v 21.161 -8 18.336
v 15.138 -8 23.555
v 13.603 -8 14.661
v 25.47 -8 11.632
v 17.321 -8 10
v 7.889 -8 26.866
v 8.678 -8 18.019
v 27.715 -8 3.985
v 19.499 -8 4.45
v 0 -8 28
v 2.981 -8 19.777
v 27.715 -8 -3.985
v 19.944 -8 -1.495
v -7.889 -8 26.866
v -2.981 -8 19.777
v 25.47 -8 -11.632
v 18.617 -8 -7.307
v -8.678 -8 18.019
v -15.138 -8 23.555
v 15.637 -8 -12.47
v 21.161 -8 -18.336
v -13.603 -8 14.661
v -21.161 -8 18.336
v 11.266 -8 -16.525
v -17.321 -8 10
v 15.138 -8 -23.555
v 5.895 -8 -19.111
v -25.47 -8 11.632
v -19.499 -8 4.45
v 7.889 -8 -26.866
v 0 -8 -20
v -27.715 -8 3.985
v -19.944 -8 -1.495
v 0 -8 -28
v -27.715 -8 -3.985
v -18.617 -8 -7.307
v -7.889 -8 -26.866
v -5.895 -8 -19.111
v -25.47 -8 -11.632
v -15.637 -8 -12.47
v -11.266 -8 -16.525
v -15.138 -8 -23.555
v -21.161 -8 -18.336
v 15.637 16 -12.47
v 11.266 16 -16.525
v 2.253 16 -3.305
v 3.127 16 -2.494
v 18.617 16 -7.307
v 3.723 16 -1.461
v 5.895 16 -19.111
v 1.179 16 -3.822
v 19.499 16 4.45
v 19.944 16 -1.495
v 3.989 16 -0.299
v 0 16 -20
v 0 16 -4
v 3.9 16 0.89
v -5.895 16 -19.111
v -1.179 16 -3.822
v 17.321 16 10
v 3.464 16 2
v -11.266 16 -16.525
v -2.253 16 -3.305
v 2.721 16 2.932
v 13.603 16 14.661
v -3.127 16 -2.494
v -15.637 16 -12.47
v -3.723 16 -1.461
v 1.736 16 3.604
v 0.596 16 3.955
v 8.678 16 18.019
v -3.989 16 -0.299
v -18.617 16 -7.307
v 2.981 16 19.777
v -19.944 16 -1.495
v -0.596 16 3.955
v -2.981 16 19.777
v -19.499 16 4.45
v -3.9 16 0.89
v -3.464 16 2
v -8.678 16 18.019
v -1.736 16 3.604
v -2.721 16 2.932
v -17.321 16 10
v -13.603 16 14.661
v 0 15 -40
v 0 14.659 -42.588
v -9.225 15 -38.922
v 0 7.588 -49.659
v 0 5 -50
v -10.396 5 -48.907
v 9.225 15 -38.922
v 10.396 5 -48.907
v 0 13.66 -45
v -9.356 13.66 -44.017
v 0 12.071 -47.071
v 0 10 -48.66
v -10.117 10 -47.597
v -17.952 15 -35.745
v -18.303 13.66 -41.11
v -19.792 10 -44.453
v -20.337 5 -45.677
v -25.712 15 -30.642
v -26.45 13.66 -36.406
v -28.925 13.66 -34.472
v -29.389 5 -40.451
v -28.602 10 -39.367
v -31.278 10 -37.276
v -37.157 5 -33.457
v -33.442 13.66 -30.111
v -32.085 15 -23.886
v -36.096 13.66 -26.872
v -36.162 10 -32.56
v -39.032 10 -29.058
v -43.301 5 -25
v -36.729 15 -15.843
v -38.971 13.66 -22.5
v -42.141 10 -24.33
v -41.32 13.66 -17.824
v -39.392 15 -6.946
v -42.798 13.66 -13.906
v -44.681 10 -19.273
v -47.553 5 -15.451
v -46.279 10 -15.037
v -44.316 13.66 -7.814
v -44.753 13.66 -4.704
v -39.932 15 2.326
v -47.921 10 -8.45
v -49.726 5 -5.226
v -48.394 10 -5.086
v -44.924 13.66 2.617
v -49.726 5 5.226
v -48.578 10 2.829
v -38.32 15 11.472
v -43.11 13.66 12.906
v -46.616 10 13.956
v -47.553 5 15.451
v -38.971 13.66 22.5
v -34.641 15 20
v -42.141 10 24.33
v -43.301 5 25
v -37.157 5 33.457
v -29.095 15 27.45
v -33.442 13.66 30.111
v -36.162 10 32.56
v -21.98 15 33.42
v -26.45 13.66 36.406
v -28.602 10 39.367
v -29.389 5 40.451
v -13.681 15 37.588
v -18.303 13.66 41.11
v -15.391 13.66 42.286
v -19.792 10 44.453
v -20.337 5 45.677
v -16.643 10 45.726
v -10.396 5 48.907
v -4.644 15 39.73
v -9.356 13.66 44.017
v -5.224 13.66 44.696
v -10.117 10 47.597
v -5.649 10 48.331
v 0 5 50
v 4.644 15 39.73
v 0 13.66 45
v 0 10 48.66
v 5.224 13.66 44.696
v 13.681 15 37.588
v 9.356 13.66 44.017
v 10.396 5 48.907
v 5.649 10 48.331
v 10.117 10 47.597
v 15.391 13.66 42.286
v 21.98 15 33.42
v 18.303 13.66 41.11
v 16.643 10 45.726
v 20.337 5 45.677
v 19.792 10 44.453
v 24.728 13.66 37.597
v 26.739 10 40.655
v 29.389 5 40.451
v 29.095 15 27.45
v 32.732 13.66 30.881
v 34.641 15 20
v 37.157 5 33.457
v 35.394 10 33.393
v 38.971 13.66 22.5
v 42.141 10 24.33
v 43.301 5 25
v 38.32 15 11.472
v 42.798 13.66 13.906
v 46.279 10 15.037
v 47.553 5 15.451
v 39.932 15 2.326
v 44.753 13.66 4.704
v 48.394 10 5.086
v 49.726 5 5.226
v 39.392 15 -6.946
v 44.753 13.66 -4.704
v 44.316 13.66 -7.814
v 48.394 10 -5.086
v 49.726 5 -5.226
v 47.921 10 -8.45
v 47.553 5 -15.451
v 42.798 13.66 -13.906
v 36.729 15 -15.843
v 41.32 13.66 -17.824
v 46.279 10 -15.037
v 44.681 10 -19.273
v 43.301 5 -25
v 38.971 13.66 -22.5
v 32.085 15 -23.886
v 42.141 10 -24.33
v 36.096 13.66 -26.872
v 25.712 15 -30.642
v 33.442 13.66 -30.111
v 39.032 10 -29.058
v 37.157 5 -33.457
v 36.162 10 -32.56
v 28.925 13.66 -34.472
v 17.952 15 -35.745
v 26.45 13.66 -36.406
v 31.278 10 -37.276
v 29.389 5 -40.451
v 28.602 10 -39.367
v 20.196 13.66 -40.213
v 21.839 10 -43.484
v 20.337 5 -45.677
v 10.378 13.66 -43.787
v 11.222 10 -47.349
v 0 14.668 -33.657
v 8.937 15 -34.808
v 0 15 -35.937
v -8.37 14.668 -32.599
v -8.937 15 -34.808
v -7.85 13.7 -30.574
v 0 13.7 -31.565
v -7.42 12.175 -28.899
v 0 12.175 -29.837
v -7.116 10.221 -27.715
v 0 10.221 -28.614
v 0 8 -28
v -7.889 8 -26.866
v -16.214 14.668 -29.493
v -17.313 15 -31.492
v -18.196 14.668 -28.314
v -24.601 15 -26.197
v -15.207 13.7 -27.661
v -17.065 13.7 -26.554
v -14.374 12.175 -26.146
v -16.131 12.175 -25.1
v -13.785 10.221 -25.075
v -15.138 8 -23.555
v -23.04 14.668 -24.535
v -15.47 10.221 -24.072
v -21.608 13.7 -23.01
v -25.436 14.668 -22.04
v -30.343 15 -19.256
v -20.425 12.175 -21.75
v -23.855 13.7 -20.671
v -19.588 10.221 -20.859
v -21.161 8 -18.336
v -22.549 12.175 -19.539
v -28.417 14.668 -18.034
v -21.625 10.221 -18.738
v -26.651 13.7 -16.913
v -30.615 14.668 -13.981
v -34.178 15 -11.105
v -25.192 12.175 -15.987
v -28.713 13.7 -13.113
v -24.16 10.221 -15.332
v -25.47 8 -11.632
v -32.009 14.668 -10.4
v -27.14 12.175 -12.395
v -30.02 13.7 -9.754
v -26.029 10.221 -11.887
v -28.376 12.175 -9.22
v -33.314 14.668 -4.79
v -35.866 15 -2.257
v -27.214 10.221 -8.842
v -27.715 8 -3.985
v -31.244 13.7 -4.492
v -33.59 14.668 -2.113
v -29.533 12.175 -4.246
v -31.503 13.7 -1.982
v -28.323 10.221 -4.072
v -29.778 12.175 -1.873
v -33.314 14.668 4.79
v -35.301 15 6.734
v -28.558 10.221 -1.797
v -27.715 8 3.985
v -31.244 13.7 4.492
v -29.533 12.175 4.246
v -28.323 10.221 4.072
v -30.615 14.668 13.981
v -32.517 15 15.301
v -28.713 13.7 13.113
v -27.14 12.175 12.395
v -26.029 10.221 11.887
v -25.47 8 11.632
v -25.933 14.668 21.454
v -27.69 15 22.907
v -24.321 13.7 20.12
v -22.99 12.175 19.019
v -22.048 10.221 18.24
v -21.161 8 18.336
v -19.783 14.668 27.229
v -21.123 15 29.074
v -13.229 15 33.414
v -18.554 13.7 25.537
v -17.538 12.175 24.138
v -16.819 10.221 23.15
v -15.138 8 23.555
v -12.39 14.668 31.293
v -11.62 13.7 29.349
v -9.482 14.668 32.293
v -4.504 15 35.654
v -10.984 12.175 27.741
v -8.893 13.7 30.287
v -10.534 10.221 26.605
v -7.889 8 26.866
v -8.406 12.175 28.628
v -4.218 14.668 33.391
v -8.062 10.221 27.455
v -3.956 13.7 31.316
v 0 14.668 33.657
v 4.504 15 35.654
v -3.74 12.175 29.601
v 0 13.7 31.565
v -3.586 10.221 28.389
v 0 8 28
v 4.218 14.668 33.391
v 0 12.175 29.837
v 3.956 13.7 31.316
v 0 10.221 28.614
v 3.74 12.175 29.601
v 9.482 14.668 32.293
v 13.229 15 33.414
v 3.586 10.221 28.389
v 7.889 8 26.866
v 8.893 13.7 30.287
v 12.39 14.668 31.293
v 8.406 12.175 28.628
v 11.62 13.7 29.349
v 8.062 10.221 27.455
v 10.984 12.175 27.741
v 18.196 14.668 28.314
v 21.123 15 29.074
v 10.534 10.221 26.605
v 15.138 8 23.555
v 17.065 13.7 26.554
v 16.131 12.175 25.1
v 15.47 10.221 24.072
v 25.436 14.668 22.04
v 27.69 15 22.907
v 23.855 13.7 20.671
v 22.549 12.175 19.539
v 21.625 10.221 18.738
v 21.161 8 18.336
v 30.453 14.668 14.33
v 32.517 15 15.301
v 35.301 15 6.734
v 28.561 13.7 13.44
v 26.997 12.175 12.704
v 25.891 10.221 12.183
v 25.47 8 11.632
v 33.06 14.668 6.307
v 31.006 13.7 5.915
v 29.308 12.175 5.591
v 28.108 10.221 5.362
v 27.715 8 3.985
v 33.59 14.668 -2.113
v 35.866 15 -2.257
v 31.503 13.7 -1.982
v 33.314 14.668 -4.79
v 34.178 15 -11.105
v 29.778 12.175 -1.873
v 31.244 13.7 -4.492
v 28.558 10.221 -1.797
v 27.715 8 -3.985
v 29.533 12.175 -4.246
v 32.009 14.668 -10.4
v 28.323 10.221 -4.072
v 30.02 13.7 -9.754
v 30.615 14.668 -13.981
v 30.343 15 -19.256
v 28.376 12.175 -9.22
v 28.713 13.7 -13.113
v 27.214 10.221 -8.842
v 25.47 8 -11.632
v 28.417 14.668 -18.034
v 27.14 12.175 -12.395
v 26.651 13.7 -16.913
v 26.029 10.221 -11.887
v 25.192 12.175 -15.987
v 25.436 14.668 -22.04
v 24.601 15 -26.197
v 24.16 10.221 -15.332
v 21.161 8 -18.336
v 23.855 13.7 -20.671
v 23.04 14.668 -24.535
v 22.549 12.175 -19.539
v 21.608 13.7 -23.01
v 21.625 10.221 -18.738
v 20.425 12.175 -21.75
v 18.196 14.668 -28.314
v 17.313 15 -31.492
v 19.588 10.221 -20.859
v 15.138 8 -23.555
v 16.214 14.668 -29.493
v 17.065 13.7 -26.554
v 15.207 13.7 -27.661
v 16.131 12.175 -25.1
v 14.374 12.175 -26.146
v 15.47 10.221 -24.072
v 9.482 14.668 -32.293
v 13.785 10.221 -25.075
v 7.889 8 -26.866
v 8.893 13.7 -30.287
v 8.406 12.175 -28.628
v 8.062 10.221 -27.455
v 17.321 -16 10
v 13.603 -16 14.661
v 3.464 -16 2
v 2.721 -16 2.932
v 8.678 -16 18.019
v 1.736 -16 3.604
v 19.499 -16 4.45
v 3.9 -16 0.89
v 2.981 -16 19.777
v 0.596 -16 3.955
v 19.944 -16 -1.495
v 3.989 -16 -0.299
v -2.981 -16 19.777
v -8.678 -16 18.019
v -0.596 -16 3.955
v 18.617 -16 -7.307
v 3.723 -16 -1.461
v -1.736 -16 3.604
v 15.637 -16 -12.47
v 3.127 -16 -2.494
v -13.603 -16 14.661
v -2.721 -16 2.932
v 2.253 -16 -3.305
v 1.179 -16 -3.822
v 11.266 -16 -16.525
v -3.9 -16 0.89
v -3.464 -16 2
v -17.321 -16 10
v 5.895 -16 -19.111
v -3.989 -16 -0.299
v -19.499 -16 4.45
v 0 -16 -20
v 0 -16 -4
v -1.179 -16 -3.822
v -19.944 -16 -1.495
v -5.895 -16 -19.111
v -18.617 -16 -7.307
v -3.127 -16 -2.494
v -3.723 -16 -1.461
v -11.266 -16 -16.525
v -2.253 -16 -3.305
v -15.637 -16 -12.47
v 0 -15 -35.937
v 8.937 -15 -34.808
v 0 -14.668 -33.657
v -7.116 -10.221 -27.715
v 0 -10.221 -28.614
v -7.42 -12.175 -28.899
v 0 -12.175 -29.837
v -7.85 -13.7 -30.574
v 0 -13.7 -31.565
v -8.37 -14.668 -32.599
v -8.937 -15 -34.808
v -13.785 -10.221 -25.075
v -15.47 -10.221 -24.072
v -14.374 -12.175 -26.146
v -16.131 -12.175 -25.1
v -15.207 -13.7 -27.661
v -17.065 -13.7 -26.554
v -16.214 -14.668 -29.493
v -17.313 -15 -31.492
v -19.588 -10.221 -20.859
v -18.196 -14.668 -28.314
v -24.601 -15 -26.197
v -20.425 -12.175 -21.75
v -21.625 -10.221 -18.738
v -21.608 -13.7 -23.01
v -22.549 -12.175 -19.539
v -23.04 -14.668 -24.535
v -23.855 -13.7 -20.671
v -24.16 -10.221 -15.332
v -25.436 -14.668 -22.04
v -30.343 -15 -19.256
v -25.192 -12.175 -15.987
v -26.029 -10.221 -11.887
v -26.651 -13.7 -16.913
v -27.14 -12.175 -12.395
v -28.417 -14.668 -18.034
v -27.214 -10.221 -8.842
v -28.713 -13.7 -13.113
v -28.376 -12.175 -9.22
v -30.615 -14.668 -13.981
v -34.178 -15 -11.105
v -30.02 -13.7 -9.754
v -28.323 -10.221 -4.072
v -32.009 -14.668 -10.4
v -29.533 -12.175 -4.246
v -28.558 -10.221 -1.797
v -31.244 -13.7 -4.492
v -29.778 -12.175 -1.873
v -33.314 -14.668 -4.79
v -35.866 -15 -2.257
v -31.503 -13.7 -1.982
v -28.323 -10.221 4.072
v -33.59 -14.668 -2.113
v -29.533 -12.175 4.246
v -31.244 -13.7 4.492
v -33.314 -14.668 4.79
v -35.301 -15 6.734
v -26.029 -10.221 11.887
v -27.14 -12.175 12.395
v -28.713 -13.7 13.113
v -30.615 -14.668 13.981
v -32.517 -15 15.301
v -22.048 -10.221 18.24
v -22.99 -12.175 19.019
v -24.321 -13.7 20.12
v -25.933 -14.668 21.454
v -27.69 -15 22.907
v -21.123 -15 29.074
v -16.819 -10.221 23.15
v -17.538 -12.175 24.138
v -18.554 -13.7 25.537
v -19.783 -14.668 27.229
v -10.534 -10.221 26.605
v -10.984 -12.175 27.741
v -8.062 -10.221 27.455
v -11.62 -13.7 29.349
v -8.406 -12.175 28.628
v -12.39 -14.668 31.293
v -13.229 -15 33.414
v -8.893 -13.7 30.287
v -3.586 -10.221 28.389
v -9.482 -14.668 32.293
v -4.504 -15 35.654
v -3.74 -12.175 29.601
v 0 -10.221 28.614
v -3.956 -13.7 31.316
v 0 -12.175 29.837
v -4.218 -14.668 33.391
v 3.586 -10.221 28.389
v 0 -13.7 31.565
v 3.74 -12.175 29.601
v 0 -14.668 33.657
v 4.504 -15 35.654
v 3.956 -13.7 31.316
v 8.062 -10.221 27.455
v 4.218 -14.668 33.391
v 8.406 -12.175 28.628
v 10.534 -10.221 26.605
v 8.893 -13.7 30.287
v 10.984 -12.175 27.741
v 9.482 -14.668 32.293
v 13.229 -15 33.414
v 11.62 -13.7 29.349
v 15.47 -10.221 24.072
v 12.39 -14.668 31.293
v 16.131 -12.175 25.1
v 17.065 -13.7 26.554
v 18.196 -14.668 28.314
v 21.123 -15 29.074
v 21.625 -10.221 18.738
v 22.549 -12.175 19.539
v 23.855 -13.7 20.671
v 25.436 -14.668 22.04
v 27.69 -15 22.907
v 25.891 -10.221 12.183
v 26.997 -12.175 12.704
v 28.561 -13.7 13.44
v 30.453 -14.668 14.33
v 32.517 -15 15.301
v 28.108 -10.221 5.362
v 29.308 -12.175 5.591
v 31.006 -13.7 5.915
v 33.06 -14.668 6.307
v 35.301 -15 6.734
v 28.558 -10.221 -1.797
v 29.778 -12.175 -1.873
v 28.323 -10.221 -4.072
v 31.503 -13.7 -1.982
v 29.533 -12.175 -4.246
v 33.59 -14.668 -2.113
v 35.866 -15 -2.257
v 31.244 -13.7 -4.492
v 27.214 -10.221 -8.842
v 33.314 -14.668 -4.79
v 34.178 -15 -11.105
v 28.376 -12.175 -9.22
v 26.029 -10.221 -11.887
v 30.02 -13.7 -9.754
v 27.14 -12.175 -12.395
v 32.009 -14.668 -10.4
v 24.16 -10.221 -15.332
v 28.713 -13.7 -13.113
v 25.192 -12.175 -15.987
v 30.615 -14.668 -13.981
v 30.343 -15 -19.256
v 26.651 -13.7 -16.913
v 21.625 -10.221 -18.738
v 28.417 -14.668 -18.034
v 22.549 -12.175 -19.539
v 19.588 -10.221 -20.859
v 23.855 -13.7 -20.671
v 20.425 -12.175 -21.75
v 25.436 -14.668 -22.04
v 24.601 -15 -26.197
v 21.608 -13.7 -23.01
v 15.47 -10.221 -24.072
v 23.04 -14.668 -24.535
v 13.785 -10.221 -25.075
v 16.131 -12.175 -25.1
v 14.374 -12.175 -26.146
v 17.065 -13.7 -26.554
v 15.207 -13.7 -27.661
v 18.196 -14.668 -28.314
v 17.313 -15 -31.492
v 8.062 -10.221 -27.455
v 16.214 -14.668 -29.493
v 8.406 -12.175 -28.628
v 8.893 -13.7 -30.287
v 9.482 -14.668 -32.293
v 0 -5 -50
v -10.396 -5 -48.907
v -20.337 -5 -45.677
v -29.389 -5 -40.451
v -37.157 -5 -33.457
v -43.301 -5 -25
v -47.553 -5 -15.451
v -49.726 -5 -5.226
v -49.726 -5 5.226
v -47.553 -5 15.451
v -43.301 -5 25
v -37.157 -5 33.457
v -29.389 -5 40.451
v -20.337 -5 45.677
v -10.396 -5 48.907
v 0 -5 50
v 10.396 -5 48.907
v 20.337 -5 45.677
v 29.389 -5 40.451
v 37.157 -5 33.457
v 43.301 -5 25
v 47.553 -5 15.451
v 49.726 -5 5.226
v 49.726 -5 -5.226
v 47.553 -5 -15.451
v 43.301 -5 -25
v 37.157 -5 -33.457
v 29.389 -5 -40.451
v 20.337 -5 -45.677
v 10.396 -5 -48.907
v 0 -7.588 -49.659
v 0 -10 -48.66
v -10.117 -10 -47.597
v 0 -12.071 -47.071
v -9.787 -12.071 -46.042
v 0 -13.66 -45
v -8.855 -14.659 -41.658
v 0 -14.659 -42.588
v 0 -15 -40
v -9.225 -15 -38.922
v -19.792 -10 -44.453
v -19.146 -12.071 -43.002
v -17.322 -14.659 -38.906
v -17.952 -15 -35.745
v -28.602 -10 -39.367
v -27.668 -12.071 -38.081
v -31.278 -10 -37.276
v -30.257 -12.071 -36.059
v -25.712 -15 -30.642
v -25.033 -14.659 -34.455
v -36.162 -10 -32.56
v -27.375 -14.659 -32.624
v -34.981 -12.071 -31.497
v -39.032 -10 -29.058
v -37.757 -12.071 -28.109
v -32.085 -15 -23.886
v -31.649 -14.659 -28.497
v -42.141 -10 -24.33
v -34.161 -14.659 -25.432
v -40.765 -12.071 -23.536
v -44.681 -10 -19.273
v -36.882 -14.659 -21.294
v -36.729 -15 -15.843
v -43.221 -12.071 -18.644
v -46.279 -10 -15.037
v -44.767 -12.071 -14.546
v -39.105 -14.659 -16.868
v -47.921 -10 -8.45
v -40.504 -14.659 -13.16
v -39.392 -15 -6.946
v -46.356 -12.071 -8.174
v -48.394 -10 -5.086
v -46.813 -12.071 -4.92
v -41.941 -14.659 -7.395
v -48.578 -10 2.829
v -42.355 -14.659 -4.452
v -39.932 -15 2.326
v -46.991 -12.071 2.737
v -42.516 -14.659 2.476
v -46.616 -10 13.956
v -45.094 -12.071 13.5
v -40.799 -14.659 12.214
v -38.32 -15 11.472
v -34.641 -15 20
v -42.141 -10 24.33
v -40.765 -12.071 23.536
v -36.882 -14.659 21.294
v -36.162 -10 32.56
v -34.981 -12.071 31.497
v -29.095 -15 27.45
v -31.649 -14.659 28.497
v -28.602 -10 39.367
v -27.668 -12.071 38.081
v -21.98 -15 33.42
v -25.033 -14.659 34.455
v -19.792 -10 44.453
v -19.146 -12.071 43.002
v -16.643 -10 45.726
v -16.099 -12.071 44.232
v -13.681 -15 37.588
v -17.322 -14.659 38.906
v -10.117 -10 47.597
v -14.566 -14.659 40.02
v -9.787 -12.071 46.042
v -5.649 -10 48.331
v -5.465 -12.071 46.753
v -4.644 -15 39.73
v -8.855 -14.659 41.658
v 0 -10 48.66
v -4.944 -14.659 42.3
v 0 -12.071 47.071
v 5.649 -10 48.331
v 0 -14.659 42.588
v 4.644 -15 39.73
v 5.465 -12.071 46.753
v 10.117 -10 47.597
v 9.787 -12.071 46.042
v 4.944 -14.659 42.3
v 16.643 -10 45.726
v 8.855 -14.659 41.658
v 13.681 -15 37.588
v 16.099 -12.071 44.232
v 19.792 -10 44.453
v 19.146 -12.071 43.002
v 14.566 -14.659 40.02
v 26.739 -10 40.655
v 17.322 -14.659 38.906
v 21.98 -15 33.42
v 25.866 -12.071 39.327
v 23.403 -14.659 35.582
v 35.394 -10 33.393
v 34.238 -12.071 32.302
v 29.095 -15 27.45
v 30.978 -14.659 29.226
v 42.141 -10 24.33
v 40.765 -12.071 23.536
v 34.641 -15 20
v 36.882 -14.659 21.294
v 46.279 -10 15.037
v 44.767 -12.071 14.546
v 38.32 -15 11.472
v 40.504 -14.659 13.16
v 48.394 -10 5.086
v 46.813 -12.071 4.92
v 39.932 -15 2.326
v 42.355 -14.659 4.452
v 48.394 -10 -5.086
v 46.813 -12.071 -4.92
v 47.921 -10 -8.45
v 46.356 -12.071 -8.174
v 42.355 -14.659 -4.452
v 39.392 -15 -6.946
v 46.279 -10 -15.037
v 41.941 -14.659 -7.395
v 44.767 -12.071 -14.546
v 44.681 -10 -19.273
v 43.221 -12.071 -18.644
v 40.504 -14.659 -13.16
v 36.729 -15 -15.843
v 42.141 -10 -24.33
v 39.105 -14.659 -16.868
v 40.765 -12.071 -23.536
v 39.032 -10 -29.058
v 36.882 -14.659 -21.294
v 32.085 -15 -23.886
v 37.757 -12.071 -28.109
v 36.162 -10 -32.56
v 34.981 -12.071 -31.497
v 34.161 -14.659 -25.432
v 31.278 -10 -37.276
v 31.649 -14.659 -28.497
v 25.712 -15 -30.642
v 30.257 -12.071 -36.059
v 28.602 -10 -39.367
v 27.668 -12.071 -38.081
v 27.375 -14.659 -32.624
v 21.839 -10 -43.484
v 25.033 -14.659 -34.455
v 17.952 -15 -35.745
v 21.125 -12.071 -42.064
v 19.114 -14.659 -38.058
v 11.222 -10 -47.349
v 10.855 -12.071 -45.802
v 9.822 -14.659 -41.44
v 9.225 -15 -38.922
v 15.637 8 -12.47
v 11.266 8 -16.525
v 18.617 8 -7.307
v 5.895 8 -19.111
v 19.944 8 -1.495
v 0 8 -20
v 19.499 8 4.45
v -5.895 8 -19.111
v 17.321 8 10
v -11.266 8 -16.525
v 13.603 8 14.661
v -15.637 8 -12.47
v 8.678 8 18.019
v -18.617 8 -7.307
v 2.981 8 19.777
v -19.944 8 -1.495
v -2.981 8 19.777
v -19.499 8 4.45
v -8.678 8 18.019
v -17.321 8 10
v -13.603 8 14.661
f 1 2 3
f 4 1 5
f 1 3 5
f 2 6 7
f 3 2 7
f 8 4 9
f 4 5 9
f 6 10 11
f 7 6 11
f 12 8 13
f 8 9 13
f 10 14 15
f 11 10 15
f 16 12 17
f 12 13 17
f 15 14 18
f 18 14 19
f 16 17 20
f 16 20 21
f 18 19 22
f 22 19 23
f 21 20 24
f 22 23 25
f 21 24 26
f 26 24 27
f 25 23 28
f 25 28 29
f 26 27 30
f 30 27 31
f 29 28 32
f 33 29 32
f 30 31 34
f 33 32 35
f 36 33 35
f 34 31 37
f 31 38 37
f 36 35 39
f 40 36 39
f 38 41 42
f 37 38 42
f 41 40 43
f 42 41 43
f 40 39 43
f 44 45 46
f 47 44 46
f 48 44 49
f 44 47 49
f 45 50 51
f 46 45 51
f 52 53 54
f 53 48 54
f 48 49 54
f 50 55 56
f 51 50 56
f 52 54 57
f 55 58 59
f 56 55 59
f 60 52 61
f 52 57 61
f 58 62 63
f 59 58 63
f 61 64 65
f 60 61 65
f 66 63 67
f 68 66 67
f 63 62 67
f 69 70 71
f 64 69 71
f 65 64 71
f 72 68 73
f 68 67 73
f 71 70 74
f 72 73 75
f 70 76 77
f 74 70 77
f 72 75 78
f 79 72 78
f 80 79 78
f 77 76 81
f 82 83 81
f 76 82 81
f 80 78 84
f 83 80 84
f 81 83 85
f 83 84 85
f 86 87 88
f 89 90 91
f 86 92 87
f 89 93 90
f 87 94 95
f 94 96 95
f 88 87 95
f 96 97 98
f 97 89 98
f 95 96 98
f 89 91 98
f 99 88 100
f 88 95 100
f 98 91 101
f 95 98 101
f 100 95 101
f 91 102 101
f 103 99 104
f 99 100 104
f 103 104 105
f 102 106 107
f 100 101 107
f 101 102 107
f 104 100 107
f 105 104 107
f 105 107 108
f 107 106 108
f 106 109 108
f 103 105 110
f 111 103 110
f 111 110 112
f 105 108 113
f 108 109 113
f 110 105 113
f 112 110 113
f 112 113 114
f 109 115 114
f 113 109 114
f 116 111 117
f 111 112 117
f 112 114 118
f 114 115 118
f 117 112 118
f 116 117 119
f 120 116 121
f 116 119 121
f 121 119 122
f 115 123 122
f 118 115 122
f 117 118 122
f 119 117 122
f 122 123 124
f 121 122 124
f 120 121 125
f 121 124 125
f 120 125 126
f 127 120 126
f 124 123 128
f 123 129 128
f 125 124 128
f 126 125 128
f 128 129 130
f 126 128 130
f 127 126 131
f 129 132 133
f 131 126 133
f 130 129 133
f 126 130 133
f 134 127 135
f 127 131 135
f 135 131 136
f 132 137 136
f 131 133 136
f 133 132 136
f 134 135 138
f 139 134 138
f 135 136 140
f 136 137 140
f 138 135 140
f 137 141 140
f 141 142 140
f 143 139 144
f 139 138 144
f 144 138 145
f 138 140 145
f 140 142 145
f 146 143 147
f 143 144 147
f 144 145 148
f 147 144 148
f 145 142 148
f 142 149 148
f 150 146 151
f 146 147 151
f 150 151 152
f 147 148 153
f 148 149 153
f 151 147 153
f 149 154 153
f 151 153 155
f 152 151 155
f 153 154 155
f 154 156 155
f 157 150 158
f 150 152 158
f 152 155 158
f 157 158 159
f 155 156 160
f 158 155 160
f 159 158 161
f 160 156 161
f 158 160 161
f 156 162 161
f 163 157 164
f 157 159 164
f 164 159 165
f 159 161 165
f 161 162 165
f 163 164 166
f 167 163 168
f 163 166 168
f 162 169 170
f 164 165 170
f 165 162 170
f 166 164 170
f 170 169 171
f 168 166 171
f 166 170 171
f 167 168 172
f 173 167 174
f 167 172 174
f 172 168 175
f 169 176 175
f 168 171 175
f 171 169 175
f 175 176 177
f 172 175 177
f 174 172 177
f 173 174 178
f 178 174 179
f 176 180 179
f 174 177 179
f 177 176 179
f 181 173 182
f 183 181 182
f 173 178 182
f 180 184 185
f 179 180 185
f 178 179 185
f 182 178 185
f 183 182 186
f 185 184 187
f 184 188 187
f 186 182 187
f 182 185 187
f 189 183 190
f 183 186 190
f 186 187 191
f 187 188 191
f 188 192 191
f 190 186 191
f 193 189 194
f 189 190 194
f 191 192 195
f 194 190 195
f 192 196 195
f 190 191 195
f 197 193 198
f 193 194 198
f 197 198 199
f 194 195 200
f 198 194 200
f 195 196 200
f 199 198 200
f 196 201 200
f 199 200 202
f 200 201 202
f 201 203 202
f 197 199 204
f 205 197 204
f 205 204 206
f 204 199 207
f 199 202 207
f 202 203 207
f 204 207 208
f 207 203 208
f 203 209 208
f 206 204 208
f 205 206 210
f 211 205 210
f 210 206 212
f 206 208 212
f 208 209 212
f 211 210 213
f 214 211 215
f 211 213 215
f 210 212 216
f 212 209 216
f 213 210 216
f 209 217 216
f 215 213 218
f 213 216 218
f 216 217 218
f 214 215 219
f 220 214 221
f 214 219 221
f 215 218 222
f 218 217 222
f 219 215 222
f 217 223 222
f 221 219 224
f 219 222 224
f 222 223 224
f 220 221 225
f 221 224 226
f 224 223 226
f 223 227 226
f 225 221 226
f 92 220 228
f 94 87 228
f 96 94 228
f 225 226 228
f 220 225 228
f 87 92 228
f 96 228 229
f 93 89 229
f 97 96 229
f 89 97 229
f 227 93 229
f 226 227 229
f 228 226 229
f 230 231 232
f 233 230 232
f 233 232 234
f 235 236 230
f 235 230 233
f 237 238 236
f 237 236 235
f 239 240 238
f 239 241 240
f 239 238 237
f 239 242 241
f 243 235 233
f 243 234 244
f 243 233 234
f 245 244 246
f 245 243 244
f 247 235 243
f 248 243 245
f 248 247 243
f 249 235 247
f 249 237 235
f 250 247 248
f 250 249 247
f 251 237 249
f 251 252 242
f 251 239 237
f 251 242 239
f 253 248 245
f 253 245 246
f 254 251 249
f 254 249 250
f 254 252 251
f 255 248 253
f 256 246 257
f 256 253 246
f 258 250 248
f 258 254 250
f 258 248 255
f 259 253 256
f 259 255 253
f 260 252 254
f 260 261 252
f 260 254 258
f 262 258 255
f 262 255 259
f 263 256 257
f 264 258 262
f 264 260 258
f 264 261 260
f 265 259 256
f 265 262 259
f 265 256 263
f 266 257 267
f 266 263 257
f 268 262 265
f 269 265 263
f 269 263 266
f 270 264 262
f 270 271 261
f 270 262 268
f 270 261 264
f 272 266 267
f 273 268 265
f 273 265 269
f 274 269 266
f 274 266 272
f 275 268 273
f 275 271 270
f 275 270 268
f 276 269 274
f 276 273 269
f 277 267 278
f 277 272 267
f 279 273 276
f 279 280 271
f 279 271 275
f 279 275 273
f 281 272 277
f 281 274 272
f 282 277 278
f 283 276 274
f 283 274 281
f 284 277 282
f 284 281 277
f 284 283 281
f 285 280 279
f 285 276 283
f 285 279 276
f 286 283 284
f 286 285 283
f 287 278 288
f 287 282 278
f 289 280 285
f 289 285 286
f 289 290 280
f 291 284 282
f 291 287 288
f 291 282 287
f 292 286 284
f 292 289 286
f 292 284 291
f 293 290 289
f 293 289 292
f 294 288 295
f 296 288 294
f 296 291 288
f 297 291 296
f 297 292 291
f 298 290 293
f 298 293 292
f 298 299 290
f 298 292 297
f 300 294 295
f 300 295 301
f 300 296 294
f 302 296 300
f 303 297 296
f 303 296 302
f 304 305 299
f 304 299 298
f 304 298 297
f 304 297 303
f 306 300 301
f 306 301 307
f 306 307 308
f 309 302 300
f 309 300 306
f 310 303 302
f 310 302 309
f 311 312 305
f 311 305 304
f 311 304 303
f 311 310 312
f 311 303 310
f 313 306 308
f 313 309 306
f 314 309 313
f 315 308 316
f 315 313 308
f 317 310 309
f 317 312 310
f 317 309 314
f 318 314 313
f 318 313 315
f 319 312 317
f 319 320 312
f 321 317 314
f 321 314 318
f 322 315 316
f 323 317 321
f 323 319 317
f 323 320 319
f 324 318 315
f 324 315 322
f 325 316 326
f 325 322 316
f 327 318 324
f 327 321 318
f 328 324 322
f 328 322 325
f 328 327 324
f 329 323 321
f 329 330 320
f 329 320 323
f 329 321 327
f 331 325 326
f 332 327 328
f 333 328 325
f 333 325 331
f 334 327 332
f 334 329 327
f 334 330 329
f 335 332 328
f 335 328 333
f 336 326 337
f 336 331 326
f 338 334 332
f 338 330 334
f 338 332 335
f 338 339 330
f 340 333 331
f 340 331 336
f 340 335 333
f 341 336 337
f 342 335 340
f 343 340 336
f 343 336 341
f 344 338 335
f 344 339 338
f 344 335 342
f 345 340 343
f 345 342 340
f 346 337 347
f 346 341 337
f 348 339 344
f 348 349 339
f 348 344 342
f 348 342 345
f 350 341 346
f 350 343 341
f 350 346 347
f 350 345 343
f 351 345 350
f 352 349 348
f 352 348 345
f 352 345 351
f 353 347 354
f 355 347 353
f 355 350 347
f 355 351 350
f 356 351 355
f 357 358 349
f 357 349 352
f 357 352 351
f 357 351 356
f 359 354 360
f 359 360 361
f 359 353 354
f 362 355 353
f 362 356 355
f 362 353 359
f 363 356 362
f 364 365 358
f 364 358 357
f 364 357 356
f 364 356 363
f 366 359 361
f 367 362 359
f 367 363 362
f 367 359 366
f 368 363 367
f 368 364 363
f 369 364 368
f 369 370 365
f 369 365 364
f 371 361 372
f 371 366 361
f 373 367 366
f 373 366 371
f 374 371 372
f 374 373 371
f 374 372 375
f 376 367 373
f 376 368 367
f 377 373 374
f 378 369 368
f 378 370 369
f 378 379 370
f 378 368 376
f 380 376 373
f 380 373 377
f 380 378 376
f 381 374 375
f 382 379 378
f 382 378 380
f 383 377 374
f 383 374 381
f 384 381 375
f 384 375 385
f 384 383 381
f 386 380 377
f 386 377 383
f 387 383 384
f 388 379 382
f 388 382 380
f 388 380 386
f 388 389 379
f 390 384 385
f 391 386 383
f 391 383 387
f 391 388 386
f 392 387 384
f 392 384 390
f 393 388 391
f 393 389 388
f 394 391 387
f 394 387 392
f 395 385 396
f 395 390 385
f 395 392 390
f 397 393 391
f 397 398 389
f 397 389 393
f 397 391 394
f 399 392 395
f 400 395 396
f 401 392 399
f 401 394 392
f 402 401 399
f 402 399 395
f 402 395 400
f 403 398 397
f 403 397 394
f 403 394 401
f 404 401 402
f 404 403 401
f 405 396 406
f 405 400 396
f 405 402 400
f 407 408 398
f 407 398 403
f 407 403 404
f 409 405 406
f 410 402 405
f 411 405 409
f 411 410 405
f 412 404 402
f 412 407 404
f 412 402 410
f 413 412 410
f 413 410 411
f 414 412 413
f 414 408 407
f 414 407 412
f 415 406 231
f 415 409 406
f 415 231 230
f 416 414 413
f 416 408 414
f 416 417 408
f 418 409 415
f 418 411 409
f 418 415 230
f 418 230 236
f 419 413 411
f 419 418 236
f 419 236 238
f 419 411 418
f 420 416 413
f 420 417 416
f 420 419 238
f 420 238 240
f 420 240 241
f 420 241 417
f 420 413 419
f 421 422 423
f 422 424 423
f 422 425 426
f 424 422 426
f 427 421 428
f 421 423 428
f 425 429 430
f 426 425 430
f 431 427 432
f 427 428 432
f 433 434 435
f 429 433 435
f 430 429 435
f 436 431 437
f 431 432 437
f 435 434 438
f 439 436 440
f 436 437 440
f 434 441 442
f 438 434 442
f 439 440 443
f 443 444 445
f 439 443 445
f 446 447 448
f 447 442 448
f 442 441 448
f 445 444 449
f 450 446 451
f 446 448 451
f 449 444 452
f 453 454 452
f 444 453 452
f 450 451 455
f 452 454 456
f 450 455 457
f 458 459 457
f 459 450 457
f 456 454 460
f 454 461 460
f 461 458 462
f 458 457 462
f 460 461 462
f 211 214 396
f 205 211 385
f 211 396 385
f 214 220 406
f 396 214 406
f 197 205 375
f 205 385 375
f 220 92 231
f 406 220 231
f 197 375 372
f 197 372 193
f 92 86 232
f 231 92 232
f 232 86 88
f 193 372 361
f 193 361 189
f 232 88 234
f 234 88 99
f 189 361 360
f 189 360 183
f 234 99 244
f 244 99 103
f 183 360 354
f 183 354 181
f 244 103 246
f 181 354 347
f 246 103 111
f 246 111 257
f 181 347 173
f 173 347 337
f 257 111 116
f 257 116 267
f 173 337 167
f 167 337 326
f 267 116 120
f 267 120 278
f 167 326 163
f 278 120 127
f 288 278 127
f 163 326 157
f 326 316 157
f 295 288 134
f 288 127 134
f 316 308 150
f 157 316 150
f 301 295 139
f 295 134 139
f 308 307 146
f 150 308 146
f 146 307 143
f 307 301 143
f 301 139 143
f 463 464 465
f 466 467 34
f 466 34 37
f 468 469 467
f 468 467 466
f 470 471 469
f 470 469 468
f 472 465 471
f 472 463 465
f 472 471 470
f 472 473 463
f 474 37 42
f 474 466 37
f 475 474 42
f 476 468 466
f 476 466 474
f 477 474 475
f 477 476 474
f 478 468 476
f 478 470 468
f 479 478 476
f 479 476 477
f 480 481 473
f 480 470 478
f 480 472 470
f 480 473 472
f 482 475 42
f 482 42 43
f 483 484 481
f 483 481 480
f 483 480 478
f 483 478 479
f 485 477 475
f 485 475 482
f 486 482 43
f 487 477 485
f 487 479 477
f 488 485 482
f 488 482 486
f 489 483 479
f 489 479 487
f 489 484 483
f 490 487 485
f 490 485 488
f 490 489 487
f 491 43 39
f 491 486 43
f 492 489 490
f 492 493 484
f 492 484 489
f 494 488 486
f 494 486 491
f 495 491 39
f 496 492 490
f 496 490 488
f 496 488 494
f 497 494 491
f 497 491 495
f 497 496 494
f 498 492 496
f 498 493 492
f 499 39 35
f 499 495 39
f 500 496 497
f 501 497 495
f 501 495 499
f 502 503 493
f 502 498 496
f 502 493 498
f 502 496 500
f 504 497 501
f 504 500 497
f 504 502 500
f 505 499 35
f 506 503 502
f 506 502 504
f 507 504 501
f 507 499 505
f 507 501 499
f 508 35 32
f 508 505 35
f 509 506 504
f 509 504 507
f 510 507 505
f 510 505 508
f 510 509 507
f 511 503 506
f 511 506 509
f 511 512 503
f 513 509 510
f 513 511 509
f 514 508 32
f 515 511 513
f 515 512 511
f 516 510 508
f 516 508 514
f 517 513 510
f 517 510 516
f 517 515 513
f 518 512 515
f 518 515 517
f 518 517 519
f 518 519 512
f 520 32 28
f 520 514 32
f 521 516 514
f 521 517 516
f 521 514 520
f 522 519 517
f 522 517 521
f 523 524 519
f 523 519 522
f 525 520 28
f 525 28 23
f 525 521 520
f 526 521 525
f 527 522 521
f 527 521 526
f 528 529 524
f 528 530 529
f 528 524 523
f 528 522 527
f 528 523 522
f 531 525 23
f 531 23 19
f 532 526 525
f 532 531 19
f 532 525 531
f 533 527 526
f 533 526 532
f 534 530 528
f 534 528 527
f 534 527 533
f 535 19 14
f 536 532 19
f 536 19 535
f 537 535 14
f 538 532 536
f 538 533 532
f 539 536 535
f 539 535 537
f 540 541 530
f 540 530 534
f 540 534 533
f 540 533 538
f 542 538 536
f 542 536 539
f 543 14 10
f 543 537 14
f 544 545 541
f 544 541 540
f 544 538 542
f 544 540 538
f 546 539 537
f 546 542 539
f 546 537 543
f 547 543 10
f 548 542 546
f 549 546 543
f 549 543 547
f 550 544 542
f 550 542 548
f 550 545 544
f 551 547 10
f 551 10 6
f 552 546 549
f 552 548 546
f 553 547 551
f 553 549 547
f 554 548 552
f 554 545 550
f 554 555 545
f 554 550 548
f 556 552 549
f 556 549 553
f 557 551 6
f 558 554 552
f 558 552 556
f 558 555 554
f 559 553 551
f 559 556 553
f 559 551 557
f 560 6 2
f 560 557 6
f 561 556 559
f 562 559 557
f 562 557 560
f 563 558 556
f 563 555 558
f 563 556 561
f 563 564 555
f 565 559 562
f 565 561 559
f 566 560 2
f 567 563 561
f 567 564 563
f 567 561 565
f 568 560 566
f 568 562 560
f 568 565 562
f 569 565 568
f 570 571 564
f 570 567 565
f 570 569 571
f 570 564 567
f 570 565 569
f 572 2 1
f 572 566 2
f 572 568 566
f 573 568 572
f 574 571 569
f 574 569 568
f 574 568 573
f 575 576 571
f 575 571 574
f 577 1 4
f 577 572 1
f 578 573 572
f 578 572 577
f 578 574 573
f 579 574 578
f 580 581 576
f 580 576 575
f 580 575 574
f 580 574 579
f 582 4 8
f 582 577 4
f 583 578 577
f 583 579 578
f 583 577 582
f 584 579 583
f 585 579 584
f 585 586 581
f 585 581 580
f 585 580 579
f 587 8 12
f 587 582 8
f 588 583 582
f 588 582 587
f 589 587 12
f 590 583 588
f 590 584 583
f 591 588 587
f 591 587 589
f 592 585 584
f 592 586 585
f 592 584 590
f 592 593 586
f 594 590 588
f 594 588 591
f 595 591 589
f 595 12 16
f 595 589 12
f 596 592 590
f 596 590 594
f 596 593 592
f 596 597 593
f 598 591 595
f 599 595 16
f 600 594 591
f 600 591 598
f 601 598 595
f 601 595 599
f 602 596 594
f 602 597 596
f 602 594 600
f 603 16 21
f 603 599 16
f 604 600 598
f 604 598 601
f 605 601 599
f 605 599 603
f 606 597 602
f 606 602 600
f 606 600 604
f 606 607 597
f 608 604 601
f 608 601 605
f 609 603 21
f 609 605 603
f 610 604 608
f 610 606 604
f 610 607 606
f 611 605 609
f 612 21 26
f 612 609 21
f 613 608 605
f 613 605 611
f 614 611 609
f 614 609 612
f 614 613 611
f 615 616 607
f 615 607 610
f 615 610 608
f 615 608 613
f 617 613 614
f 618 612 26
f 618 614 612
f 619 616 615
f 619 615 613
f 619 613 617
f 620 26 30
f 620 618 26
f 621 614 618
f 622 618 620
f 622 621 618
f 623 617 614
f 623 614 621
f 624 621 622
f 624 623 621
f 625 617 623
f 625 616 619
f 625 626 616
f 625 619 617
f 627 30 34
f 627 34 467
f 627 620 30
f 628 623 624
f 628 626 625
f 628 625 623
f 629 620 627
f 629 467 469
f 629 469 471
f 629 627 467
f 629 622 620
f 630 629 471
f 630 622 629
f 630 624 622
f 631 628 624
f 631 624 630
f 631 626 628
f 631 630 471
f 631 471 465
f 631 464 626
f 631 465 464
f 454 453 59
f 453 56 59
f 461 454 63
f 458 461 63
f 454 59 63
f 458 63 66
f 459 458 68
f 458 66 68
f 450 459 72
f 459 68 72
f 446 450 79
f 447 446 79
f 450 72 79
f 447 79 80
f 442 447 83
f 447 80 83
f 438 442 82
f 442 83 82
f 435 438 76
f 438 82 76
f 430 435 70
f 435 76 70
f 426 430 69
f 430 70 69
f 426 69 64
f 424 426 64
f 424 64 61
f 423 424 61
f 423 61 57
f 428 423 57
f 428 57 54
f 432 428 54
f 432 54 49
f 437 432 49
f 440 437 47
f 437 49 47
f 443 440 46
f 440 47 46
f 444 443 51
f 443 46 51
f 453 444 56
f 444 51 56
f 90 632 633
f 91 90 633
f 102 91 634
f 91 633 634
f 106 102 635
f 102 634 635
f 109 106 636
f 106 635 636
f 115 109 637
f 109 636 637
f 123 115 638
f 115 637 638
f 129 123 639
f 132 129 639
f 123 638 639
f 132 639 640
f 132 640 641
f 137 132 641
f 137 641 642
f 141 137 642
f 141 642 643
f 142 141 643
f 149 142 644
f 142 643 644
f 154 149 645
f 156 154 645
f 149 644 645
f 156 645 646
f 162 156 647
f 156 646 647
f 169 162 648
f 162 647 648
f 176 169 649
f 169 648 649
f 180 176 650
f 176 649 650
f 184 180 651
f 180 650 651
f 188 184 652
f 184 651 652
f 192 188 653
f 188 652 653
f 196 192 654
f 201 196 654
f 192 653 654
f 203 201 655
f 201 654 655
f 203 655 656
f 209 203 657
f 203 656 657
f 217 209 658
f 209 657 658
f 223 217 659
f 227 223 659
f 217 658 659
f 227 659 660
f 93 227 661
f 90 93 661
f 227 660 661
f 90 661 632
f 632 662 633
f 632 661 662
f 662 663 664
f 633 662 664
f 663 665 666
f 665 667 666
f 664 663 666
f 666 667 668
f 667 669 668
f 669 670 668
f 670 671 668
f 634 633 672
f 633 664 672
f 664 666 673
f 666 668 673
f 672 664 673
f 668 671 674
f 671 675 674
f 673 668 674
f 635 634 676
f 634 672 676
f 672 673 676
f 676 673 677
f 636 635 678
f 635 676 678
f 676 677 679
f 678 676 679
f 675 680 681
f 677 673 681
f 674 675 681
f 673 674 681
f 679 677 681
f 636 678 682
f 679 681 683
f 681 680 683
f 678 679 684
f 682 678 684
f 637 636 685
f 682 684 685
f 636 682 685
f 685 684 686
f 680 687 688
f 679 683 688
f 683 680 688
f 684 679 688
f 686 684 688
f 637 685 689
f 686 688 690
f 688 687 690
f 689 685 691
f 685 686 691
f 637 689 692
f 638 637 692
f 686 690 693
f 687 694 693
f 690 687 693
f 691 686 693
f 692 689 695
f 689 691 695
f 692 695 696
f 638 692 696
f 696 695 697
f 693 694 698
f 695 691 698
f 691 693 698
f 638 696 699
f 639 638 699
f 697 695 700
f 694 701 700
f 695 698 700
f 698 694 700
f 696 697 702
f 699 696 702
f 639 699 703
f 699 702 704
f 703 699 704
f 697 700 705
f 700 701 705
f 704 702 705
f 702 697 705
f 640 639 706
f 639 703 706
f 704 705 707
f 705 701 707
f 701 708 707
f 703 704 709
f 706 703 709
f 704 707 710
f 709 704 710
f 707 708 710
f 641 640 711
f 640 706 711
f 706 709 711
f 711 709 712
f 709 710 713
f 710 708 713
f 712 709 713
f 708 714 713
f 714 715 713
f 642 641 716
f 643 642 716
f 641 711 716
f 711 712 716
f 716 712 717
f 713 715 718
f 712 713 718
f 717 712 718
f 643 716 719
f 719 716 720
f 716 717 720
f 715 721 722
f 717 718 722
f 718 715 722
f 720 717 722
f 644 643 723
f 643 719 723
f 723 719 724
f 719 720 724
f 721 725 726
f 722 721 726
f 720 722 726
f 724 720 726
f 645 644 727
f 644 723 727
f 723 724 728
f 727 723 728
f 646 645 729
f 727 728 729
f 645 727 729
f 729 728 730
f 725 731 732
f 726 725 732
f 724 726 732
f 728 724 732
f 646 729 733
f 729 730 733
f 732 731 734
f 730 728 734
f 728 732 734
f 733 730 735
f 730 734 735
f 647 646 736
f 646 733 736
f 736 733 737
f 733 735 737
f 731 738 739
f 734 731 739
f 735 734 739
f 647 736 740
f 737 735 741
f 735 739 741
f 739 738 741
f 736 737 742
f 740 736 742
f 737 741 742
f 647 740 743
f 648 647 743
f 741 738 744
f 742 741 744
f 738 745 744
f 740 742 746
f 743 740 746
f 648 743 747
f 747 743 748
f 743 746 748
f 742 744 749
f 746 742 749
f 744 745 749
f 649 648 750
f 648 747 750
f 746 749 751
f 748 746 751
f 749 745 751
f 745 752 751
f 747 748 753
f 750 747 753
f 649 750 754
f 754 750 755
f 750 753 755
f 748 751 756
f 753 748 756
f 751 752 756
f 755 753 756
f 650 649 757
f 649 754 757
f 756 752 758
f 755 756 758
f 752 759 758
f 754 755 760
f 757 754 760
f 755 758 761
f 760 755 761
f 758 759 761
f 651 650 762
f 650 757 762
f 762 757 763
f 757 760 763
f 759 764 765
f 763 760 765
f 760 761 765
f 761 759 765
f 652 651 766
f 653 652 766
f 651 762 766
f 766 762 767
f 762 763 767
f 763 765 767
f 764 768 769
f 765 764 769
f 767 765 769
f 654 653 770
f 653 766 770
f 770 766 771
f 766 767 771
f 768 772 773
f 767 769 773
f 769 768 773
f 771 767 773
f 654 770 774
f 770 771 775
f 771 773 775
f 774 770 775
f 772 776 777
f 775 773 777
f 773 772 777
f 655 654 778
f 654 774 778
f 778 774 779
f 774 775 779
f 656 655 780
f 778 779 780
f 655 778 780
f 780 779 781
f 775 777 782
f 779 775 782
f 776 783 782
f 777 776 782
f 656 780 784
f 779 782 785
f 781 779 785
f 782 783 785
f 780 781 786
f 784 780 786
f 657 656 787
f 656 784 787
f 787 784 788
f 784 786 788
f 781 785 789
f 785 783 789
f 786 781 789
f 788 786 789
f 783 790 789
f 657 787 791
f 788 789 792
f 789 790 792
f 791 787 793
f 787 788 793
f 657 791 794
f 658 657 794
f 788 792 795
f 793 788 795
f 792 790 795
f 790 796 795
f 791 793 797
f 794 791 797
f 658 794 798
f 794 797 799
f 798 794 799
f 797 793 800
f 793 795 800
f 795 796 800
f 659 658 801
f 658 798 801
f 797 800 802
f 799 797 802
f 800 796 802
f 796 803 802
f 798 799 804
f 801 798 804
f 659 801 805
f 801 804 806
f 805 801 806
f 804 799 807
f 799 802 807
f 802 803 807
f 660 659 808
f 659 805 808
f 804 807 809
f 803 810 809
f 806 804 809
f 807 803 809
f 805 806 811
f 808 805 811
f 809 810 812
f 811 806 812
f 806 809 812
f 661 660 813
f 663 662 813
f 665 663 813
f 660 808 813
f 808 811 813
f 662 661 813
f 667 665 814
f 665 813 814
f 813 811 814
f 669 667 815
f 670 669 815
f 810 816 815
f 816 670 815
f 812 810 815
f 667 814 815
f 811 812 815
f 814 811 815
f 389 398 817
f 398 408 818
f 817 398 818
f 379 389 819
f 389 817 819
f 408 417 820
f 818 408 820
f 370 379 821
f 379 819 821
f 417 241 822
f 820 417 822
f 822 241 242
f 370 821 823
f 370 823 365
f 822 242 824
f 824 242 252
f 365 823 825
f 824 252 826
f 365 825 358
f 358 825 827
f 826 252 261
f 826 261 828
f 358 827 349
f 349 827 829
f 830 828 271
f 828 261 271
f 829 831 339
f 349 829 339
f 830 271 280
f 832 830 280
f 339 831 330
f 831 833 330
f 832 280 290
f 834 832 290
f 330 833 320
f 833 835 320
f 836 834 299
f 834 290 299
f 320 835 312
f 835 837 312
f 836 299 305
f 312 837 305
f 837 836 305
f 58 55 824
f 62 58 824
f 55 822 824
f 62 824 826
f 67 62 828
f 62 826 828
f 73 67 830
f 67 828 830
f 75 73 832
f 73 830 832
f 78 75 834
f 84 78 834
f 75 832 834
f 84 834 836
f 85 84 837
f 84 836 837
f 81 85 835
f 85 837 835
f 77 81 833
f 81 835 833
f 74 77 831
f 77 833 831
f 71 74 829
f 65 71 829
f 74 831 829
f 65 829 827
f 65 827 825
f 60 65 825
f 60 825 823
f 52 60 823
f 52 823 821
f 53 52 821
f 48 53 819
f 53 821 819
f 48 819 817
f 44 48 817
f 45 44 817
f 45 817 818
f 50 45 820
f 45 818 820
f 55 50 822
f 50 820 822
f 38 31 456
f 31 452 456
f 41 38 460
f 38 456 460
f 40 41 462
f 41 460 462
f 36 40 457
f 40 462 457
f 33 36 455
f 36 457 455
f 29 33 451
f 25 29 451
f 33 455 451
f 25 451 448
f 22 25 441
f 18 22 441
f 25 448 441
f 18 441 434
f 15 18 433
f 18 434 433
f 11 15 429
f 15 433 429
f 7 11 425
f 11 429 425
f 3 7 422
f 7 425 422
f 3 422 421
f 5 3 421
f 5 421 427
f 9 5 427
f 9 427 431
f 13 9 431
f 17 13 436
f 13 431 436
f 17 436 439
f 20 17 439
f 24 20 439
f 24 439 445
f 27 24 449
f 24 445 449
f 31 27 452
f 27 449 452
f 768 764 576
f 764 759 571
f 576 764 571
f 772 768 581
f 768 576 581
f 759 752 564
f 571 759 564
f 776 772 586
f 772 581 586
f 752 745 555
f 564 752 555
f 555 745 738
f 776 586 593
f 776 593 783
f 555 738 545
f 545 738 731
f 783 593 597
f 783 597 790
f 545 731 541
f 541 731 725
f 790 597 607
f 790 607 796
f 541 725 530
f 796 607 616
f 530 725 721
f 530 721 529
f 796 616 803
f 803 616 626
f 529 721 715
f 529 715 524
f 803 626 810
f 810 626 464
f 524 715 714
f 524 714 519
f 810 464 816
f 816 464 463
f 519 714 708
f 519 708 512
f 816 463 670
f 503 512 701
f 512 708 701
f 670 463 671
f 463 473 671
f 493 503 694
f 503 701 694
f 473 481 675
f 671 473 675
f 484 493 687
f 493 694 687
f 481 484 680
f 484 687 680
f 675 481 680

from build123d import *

# Parameters (mm, degrees)
CONG_1_R = 10
CONG_2_R = 8


with BuildPart() as part:
    # Esquisse1 → Révolution1 (revolve)
    with BuildSketch(Plane.XY, mode=Mode.PRIVATE) as r_volution1_sk:
        Polygon((-4, -16), (-4, 16), (-20, 16), (-20, 8), (-28, 8), (-28, 15), (-50, 15), (-50, -15), (-28, -15), (-28, -8), (-20, -8), (-20, -16), align=None)
    revolve(r_volution1_sk.sketch.rotate(Axis((0, 0, 0), (0, 1, 0)), 270), axis=Axis((0, 0, 0), (0, 1, 0)))

    # Congé1
    cong_1_edges = [part.edges().sort_by_distance(p)[0] for p in [
        (0, -15, 50),
        (0, 15, 50),
    ]]
    fillet(cong_1_edges, radius=CONG_1_R)

    # Congé2
    # the kernel refuses this fillet: 8 mm, written as the material it takes off along each edge
    with BuildSketch(Plane(origin=(0, -15, 0), x_dir=(0, 0, -1), z_dir=(1, 0, 0))) as cong_2_piece_1:
        with BuildLine():
            CenterArc((35.937253933, 8), CONG_2_R, 187.180755781, 82.819244219)
            Line((28, 7), (27.841254921, 6.98))
            ThreePointArc((27.841254921, 6.98), (27.84, 3.5), (27.84, 0))
            Line((27.84, 0), (28, -0.16))
            Line((28, -0.16), (35.937253933, -0.16))
            Line((35.937253933, -0.16), (35.937253933, 0))
        make_face()
    revolve(axis=Axis((0, -15, 0), (0, 1, 0)), mode=Mode.SUBTRACT)
    with BuildSketch(Plane(origin=(0, 15, 0), x_dir=(0, 0, -1), z_dir=(1, 0, 0))) as cong_2_piece_2:
        with BuildLine():
            CenterArc((35.937253933, -8), CONG_2_R, 90, 82.819244219)
            Line((28, -7), (27.841254921, -6.98))
            ThreePointArc((27.841254921, -6.98), (27.84, -3.5), (27.84, 0))
            Line((27.84, 0), (28, 0.16))
            Line((28, 0.16), (35.937253933, 0.16))
            Line((35.937253933, 0.16), (35.937253933, 0))
        make_face()
    revolve(axis=Axis((0, 15, 0), (0, 1, 0)), mode=Mode.SUBTRACT)


solid = part.part
